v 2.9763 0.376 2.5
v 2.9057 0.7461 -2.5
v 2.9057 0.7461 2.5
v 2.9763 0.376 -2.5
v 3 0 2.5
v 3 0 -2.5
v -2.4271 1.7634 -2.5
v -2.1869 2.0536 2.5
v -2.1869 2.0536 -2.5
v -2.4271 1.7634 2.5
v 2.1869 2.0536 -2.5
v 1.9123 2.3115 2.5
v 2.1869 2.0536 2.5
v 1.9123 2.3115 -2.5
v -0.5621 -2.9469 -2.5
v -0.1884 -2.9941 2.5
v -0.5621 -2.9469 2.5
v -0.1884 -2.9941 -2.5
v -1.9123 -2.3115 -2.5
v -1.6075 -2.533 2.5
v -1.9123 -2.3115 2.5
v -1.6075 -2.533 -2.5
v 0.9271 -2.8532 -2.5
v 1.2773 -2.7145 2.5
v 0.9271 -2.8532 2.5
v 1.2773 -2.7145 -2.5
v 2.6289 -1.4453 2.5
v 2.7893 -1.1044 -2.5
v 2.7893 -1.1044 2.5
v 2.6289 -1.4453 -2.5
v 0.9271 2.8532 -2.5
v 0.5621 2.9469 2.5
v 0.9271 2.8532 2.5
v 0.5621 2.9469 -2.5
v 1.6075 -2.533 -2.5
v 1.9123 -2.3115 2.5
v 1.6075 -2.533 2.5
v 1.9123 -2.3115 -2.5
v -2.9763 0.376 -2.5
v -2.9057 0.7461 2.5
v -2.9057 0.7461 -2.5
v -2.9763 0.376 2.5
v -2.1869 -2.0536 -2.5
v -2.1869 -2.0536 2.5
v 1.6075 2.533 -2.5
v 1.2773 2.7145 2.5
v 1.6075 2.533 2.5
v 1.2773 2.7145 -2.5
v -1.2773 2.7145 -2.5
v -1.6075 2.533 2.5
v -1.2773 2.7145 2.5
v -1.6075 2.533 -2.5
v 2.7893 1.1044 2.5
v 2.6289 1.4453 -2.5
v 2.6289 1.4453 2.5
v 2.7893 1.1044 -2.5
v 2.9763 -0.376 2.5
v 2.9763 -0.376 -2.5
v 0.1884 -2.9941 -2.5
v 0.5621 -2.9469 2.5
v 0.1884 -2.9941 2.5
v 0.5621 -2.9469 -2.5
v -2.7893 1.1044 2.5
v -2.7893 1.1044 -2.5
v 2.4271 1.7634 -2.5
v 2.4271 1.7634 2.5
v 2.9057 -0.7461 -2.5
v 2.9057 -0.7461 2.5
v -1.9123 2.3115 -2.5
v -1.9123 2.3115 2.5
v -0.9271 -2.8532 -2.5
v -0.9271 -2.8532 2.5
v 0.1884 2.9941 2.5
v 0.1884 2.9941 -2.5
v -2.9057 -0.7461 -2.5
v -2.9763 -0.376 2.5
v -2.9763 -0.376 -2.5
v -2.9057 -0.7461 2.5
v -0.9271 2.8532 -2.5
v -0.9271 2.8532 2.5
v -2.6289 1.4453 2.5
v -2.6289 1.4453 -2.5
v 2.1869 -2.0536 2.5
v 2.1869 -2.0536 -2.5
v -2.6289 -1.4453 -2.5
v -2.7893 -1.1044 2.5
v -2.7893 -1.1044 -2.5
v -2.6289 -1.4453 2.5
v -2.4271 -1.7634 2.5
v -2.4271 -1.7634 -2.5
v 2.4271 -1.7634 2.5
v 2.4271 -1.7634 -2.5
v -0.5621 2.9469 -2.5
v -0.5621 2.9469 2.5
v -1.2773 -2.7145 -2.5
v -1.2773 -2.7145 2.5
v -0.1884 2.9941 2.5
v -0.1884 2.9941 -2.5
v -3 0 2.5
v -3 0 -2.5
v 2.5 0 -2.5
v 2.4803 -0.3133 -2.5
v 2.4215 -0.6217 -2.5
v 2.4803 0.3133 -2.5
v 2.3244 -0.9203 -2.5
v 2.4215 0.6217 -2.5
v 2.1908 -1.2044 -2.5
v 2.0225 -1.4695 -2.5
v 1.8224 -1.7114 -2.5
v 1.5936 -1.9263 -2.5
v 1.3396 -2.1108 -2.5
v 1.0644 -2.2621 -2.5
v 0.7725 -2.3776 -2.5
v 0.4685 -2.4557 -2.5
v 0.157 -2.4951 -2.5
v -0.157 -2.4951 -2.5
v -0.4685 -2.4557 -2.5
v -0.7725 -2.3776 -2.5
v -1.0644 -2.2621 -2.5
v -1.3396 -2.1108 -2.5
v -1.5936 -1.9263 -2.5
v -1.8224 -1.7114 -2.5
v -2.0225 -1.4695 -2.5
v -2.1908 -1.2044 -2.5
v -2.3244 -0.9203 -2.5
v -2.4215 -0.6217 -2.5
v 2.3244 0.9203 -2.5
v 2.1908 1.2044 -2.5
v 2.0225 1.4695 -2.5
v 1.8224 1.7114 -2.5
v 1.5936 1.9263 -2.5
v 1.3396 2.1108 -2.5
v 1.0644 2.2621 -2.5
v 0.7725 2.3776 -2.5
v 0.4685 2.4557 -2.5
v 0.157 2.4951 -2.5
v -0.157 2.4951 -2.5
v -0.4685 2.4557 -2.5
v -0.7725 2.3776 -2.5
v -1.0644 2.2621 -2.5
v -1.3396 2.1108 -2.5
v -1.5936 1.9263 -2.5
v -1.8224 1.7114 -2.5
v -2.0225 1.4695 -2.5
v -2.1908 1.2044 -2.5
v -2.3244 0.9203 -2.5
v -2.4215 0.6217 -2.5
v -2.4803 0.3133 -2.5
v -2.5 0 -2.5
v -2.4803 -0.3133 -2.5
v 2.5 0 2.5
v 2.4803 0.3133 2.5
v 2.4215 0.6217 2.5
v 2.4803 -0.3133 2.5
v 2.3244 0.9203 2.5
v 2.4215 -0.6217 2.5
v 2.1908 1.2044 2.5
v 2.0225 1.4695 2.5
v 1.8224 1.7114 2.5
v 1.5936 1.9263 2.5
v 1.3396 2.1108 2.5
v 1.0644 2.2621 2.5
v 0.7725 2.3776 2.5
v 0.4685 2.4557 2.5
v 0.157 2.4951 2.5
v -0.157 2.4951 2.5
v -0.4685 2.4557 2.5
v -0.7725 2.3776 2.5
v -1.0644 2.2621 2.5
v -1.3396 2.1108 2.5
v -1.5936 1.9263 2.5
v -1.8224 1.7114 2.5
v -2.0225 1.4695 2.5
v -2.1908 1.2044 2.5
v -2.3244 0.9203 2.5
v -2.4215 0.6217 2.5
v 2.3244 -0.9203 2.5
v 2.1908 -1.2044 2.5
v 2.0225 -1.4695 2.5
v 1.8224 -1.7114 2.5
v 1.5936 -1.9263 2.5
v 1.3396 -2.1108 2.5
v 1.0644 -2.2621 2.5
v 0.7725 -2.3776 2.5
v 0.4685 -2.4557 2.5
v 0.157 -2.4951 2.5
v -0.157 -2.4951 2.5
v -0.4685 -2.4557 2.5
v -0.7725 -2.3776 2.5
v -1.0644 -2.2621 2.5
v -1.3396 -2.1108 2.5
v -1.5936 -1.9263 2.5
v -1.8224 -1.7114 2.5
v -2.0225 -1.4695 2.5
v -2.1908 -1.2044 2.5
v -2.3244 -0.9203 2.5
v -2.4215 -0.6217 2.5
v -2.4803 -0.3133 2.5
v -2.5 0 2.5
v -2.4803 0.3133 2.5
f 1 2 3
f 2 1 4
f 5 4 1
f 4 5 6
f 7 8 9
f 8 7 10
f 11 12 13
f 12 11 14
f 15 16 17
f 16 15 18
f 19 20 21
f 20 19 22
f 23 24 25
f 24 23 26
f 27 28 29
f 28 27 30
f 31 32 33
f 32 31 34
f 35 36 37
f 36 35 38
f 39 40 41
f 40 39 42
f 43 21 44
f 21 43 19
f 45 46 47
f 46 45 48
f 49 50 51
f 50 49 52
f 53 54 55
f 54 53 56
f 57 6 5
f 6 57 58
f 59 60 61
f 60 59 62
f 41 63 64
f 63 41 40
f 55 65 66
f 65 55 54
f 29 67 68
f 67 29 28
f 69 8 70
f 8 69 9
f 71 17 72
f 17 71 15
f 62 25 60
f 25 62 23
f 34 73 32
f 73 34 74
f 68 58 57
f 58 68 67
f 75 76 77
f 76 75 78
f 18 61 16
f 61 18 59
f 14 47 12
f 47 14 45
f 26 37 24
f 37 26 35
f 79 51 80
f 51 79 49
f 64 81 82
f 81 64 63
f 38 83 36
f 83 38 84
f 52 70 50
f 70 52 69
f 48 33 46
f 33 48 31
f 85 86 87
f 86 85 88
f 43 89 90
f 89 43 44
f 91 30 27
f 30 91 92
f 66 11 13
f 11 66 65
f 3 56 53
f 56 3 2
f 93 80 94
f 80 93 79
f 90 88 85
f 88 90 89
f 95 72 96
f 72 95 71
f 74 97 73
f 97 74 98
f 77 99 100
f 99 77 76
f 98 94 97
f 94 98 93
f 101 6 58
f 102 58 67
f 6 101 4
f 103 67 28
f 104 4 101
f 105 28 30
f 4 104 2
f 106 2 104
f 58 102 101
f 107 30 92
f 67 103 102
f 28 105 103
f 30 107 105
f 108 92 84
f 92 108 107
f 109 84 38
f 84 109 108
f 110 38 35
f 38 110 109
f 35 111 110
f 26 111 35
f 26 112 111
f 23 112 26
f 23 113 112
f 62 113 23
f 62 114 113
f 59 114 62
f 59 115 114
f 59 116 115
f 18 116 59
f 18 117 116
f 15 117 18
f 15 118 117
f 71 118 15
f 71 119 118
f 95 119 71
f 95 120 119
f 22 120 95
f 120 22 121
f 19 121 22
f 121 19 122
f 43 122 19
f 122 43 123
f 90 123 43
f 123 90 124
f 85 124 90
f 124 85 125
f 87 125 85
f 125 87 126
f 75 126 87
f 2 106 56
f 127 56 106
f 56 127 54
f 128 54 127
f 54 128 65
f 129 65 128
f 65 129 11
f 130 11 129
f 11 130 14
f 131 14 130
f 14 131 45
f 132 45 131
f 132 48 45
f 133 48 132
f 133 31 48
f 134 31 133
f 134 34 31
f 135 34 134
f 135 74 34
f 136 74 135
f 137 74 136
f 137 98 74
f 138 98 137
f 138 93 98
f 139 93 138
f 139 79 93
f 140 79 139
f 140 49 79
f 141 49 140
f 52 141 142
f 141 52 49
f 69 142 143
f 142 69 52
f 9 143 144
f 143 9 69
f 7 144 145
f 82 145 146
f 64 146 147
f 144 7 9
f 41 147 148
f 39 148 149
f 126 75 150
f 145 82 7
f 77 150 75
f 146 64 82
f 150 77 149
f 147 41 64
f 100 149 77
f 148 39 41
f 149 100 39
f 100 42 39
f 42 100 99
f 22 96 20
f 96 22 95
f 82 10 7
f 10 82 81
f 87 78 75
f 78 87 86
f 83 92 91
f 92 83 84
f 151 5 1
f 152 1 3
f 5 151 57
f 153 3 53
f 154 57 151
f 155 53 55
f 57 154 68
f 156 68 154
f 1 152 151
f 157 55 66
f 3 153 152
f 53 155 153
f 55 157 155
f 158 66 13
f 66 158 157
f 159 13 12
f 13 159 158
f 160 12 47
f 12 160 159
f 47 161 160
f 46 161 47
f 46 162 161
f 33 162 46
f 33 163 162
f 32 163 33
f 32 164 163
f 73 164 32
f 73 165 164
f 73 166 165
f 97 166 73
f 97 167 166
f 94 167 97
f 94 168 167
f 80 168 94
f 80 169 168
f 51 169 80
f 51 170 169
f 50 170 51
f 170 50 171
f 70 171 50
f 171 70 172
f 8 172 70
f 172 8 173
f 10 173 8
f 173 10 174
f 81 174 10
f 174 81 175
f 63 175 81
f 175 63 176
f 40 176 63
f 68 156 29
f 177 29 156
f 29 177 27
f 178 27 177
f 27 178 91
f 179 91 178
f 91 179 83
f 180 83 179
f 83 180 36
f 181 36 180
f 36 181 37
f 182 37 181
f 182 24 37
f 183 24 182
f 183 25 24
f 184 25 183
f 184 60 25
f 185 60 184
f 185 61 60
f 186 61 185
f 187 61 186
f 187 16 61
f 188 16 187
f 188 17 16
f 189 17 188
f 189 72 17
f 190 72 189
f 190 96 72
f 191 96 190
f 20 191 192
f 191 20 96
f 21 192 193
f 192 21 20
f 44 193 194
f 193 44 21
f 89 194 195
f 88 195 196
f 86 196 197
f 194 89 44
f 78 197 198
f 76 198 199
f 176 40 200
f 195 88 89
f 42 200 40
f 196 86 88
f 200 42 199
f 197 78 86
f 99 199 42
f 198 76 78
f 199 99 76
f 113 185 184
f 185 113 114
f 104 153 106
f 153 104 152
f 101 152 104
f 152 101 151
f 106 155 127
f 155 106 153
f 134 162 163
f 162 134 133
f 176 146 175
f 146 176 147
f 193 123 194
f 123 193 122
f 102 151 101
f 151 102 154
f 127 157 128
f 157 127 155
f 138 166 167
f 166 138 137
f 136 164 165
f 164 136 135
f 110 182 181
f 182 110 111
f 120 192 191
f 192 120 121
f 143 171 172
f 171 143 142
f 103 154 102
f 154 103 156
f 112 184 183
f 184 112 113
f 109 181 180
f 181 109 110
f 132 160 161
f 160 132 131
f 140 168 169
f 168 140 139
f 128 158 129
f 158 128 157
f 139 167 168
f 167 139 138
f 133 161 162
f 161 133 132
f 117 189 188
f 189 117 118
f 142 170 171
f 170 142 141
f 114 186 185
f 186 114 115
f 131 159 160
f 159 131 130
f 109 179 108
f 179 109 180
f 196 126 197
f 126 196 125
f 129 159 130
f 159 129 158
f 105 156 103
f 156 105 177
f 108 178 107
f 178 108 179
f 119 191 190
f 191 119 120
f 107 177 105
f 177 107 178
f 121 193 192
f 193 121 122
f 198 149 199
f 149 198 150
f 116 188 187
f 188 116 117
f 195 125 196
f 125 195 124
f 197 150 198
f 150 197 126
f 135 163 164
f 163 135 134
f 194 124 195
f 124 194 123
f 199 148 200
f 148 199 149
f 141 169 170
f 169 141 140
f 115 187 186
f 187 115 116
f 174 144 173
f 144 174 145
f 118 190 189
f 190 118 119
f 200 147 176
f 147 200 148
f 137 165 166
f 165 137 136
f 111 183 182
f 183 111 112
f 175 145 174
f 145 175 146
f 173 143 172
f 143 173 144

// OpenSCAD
$fn = 50;


difference() {
	union() {
		translate(v = [0, 0, -2.5000000000]) {
			cylinder(h = 5, r = 3.0000000000);
		}
	}
	union() {
		translate(v = [0, 0, -100.0000000000]) {
			cylinder(h = 200, r = 2.5000000000);
		}
	}
}
